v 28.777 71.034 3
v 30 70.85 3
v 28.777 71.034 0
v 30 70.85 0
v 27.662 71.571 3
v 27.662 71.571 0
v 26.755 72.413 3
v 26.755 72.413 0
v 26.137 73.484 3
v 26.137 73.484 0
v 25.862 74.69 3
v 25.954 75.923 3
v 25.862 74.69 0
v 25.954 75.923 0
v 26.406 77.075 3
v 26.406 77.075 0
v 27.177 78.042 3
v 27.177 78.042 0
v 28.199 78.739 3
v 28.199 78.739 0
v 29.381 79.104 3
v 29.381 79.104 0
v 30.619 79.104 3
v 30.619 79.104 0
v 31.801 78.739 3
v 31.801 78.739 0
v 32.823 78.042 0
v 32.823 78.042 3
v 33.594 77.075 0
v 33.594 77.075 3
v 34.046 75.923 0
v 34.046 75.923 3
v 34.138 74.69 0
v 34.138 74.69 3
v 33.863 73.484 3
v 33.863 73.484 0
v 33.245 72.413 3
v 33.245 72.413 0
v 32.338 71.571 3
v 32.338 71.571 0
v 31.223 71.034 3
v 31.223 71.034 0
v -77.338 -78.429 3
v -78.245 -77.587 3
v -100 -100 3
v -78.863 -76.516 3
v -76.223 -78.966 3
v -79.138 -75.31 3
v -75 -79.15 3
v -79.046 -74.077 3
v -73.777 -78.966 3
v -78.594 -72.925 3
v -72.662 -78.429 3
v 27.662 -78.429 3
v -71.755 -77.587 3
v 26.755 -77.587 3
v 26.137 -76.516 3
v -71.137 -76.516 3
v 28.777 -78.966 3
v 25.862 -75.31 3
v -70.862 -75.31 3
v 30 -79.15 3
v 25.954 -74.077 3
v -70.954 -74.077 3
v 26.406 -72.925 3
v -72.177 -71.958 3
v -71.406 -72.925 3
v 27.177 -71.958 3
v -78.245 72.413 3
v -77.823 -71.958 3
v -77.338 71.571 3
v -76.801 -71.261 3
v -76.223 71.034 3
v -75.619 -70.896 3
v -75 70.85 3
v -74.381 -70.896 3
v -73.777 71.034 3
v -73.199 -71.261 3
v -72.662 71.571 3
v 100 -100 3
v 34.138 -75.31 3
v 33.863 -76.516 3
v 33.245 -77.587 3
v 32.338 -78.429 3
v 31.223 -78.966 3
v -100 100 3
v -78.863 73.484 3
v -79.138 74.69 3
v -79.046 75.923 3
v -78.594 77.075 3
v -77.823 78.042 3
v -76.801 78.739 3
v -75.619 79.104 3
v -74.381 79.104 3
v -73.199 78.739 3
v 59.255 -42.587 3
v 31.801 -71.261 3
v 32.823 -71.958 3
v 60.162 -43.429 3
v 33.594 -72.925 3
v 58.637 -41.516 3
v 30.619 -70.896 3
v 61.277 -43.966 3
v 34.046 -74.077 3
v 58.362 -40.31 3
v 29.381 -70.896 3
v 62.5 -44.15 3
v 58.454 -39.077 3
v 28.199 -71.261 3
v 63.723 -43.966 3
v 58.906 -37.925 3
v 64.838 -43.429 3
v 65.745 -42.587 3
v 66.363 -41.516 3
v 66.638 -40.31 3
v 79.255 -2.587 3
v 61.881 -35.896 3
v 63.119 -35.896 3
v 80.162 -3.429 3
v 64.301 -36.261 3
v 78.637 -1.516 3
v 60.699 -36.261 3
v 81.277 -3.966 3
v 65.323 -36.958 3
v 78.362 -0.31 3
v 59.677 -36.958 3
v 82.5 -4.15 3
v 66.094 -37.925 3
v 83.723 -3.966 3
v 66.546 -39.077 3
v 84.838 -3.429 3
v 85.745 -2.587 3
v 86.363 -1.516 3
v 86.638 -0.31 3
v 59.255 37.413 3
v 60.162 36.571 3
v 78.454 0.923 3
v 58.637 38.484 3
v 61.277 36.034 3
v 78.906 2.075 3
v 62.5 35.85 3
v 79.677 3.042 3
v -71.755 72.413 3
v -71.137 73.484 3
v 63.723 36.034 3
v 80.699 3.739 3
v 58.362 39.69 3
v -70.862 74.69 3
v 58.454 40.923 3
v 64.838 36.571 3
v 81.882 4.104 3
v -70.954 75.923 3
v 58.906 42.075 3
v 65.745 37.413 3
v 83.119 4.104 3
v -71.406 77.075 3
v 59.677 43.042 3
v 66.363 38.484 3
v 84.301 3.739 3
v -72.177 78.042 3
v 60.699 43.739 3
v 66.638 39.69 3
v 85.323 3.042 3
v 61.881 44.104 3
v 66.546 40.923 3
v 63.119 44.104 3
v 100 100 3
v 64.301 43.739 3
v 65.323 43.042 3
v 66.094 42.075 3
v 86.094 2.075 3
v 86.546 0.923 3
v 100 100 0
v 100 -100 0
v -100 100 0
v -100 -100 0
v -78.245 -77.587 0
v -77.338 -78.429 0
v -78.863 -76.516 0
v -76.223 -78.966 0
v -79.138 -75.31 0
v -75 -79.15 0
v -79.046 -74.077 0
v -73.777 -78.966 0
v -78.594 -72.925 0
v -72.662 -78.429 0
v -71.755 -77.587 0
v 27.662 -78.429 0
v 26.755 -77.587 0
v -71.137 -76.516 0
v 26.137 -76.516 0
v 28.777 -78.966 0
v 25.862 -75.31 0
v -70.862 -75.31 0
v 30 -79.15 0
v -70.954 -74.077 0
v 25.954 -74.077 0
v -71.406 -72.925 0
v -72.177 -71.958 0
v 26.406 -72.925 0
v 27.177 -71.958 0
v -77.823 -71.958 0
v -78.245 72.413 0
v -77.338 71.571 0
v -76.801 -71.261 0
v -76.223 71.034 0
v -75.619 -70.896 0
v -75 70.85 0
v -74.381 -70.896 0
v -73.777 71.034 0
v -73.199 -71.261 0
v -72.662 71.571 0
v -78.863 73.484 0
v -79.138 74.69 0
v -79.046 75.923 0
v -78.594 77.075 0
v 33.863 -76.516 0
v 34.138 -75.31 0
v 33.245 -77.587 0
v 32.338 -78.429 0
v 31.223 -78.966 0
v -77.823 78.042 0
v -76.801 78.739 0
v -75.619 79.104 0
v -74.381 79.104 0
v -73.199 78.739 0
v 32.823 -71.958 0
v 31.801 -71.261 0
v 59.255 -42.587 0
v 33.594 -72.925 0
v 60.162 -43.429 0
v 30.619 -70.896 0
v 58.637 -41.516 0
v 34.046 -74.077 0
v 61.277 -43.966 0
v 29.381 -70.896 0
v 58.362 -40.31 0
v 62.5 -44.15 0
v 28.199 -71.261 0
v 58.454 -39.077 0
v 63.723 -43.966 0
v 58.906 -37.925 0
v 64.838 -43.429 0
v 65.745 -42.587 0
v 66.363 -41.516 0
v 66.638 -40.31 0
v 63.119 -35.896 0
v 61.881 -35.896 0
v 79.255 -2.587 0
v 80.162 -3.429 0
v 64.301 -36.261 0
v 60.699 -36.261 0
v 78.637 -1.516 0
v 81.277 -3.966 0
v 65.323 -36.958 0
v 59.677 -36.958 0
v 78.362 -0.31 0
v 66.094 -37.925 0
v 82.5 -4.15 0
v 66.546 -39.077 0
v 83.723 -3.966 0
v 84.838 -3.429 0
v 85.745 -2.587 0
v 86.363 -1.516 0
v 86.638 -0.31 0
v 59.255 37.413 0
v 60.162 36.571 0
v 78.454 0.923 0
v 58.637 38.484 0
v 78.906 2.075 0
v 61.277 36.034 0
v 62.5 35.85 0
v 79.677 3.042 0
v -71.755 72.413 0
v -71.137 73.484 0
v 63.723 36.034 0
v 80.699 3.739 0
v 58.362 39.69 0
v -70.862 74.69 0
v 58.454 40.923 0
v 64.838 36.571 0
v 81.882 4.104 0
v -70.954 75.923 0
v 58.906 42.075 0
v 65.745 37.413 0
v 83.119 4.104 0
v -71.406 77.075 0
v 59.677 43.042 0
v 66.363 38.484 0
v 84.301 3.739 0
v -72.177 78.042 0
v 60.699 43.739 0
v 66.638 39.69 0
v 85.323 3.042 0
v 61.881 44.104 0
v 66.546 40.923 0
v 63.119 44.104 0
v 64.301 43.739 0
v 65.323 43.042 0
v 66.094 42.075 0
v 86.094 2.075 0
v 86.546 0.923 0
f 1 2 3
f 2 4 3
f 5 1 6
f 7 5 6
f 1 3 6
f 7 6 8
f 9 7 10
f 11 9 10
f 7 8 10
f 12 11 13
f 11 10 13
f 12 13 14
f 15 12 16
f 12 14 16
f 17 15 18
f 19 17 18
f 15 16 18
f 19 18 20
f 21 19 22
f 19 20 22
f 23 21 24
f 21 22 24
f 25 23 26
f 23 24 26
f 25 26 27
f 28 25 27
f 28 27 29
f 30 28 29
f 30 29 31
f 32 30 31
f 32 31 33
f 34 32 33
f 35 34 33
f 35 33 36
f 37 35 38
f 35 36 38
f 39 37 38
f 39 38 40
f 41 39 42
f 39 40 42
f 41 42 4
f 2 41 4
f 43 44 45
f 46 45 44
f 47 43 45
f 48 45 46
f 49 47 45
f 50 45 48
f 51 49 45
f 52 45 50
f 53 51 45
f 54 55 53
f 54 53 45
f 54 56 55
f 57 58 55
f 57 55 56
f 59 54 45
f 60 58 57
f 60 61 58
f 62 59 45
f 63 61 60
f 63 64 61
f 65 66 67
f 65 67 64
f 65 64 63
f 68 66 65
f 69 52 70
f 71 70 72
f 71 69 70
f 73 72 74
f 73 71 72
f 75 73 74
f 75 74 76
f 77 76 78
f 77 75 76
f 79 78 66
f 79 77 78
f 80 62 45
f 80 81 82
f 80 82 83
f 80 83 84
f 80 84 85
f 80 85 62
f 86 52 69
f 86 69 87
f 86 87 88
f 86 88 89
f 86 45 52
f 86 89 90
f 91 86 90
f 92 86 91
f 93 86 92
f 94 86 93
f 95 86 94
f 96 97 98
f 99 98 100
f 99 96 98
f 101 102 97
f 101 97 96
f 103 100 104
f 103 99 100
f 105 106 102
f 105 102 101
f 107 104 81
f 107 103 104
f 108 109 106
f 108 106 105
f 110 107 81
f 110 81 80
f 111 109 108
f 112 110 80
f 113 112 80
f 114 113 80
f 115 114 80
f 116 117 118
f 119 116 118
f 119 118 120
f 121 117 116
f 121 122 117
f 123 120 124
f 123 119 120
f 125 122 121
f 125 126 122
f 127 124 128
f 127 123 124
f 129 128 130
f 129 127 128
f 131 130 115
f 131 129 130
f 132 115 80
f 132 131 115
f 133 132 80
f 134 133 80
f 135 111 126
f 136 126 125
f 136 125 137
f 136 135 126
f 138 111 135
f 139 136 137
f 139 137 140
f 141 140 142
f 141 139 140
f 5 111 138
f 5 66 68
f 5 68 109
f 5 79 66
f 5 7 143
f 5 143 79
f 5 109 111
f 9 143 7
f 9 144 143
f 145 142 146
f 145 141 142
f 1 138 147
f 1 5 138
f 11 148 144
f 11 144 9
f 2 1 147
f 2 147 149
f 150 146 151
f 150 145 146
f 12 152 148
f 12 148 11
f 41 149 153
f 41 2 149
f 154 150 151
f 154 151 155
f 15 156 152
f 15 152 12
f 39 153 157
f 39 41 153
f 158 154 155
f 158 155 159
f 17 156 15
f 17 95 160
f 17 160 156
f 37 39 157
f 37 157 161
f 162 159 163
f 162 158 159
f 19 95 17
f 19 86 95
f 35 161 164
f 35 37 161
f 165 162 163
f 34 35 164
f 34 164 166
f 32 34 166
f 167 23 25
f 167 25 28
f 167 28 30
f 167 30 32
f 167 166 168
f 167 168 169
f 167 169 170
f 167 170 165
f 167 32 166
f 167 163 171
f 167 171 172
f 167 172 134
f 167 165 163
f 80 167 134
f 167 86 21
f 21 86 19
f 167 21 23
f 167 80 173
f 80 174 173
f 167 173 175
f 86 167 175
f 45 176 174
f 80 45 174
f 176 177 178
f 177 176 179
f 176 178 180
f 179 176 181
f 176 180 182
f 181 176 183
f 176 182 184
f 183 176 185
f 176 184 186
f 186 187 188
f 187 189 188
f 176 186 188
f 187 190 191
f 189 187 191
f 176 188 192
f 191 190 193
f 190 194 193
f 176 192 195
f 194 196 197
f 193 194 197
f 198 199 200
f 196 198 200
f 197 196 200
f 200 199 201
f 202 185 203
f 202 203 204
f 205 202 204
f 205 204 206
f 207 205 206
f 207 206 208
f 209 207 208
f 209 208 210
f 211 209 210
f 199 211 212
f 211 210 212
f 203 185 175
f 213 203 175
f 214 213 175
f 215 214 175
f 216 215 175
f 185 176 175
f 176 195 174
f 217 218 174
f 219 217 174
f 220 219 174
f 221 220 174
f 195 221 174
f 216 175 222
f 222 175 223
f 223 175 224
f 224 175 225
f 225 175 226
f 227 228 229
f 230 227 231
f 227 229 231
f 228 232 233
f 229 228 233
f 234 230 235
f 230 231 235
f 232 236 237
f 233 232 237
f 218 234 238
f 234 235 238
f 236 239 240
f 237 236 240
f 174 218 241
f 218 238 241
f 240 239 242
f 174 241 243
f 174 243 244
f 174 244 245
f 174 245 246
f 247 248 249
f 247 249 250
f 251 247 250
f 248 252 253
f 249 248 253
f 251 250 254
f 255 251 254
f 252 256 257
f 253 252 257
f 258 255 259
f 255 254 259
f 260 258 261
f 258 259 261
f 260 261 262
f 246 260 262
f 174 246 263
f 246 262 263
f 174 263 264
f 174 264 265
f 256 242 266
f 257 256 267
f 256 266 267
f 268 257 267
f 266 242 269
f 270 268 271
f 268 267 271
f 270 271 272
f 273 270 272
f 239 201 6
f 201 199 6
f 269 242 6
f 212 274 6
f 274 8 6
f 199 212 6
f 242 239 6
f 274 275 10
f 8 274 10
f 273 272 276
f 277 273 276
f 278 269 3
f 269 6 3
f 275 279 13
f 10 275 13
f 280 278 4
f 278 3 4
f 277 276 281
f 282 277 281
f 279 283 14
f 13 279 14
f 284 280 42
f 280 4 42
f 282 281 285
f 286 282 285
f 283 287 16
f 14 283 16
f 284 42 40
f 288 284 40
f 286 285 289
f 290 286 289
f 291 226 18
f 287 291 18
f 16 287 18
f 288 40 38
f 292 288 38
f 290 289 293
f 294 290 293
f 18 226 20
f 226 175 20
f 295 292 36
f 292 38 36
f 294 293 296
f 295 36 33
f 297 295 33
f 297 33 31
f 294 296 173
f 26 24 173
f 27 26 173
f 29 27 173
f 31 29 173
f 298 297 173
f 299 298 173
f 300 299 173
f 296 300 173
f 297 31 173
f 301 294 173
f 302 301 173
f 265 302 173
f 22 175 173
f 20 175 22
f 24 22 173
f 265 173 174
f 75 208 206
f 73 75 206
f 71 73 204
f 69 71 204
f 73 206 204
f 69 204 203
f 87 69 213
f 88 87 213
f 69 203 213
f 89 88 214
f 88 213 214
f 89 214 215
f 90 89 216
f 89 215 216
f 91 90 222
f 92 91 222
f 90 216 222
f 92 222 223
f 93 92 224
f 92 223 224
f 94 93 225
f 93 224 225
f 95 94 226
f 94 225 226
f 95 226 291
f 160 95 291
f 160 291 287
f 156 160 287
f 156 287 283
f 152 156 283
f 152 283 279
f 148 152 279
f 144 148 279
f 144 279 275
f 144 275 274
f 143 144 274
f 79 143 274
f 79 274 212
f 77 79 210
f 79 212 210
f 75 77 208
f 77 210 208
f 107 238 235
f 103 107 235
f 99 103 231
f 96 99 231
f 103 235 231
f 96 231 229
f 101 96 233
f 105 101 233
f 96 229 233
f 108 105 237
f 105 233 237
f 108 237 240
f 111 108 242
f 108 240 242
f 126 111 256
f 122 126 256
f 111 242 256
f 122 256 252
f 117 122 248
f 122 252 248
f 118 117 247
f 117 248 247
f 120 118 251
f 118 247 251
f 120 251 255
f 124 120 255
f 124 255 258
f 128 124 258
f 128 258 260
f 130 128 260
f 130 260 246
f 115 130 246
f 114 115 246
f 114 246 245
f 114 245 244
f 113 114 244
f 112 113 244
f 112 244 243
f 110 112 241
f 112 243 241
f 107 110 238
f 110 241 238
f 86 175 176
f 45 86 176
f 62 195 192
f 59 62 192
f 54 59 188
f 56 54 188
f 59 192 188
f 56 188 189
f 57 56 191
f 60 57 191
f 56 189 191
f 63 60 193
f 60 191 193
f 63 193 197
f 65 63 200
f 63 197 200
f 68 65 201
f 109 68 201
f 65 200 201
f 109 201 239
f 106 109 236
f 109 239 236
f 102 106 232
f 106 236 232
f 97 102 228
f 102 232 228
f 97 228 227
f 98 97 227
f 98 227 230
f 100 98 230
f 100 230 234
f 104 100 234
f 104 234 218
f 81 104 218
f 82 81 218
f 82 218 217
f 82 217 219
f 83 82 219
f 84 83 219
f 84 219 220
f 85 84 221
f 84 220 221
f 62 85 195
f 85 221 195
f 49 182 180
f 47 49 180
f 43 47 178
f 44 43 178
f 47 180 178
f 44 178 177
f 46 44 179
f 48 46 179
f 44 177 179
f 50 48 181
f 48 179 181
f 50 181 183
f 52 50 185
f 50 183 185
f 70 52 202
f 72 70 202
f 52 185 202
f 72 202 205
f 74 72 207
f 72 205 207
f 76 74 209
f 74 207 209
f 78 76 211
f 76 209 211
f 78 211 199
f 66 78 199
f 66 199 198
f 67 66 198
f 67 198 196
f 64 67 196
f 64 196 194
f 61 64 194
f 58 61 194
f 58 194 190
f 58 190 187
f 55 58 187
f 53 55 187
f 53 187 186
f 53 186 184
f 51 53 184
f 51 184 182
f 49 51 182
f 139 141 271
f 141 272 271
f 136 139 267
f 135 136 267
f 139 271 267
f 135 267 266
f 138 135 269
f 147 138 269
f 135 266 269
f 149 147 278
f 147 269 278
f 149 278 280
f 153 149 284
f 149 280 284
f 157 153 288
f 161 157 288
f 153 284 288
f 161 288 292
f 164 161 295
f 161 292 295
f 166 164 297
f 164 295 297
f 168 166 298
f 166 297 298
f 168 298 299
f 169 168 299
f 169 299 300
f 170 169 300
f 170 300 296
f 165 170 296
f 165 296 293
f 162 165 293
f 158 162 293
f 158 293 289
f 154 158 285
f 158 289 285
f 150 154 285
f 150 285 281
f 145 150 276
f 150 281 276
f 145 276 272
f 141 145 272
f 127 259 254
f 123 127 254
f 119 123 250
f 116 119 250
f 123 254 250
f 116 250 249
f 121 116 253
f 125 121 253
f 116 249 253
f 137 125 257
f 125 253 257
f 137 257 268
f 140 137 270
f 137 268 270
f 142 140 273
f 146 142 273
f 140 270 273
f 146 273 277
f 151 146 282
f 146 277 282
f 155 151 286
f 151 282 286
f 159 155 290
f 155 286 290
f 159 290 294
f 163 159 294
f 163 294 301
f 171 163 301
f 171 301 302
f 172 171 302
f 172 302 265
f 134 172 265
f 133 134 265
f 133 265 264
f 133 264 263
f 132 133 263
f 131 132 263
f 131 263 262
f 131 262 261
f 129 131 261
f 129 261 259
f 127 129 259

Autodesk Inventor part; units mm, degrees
ref_plane "YZ Plane" through (0, 0, 0) normal (1, 0, 0) x (0, 1, 0)
ref_plane "XZ Plane" through (0, 0, 0) normal (0, 1, 0) x (-1, 0, 0)
ref_plane "XY Plane" through (0, 0, 0) normal (0, 0, 1) x (1, 0, 0)
sketch "Sketch1" plane through (0, 0, 0) normal (0, 0, 1) x (1, 0, 0)
  line L0 (-100, -100) -> (100, -100) projected
  line L1 (100, -100) -> (100, 100) projected
  line L2 (100, 100) -> (-100, 100) projected
  line L3 (-100, 100) -> (-100, -100) projected
  point P0 (0, 0)
extrude "Extrusion1" add sketch "Sketch1" along normal blind 3
sketch "Sketch2" plane through (0, 0, 3) normal (0, 0, 1) x (1, 0, 0)
  point P0 (0, 0)
  point P1 (-75, 75)
  point P2 (30, 75)
  point P3 (62.5, 40)
  point P4 (82.5001, 0)
  point P5 (62.5, -40)
  point P6 (30, -75)
  point P7 (-75, -75)
hole "Hole1" at (-75, 75, 3) at (30, 75, 3) at (62.5, 40, 3) at (82.5001, 0, 3) at (62.5, -40, 3) at (30, -75, 3) at (-75, -75, 3) direction (0, 0, -1) diameter 8.3 end through all
properties part number "PortaTornillos" material "MDF Medium Density Fiberboard"
